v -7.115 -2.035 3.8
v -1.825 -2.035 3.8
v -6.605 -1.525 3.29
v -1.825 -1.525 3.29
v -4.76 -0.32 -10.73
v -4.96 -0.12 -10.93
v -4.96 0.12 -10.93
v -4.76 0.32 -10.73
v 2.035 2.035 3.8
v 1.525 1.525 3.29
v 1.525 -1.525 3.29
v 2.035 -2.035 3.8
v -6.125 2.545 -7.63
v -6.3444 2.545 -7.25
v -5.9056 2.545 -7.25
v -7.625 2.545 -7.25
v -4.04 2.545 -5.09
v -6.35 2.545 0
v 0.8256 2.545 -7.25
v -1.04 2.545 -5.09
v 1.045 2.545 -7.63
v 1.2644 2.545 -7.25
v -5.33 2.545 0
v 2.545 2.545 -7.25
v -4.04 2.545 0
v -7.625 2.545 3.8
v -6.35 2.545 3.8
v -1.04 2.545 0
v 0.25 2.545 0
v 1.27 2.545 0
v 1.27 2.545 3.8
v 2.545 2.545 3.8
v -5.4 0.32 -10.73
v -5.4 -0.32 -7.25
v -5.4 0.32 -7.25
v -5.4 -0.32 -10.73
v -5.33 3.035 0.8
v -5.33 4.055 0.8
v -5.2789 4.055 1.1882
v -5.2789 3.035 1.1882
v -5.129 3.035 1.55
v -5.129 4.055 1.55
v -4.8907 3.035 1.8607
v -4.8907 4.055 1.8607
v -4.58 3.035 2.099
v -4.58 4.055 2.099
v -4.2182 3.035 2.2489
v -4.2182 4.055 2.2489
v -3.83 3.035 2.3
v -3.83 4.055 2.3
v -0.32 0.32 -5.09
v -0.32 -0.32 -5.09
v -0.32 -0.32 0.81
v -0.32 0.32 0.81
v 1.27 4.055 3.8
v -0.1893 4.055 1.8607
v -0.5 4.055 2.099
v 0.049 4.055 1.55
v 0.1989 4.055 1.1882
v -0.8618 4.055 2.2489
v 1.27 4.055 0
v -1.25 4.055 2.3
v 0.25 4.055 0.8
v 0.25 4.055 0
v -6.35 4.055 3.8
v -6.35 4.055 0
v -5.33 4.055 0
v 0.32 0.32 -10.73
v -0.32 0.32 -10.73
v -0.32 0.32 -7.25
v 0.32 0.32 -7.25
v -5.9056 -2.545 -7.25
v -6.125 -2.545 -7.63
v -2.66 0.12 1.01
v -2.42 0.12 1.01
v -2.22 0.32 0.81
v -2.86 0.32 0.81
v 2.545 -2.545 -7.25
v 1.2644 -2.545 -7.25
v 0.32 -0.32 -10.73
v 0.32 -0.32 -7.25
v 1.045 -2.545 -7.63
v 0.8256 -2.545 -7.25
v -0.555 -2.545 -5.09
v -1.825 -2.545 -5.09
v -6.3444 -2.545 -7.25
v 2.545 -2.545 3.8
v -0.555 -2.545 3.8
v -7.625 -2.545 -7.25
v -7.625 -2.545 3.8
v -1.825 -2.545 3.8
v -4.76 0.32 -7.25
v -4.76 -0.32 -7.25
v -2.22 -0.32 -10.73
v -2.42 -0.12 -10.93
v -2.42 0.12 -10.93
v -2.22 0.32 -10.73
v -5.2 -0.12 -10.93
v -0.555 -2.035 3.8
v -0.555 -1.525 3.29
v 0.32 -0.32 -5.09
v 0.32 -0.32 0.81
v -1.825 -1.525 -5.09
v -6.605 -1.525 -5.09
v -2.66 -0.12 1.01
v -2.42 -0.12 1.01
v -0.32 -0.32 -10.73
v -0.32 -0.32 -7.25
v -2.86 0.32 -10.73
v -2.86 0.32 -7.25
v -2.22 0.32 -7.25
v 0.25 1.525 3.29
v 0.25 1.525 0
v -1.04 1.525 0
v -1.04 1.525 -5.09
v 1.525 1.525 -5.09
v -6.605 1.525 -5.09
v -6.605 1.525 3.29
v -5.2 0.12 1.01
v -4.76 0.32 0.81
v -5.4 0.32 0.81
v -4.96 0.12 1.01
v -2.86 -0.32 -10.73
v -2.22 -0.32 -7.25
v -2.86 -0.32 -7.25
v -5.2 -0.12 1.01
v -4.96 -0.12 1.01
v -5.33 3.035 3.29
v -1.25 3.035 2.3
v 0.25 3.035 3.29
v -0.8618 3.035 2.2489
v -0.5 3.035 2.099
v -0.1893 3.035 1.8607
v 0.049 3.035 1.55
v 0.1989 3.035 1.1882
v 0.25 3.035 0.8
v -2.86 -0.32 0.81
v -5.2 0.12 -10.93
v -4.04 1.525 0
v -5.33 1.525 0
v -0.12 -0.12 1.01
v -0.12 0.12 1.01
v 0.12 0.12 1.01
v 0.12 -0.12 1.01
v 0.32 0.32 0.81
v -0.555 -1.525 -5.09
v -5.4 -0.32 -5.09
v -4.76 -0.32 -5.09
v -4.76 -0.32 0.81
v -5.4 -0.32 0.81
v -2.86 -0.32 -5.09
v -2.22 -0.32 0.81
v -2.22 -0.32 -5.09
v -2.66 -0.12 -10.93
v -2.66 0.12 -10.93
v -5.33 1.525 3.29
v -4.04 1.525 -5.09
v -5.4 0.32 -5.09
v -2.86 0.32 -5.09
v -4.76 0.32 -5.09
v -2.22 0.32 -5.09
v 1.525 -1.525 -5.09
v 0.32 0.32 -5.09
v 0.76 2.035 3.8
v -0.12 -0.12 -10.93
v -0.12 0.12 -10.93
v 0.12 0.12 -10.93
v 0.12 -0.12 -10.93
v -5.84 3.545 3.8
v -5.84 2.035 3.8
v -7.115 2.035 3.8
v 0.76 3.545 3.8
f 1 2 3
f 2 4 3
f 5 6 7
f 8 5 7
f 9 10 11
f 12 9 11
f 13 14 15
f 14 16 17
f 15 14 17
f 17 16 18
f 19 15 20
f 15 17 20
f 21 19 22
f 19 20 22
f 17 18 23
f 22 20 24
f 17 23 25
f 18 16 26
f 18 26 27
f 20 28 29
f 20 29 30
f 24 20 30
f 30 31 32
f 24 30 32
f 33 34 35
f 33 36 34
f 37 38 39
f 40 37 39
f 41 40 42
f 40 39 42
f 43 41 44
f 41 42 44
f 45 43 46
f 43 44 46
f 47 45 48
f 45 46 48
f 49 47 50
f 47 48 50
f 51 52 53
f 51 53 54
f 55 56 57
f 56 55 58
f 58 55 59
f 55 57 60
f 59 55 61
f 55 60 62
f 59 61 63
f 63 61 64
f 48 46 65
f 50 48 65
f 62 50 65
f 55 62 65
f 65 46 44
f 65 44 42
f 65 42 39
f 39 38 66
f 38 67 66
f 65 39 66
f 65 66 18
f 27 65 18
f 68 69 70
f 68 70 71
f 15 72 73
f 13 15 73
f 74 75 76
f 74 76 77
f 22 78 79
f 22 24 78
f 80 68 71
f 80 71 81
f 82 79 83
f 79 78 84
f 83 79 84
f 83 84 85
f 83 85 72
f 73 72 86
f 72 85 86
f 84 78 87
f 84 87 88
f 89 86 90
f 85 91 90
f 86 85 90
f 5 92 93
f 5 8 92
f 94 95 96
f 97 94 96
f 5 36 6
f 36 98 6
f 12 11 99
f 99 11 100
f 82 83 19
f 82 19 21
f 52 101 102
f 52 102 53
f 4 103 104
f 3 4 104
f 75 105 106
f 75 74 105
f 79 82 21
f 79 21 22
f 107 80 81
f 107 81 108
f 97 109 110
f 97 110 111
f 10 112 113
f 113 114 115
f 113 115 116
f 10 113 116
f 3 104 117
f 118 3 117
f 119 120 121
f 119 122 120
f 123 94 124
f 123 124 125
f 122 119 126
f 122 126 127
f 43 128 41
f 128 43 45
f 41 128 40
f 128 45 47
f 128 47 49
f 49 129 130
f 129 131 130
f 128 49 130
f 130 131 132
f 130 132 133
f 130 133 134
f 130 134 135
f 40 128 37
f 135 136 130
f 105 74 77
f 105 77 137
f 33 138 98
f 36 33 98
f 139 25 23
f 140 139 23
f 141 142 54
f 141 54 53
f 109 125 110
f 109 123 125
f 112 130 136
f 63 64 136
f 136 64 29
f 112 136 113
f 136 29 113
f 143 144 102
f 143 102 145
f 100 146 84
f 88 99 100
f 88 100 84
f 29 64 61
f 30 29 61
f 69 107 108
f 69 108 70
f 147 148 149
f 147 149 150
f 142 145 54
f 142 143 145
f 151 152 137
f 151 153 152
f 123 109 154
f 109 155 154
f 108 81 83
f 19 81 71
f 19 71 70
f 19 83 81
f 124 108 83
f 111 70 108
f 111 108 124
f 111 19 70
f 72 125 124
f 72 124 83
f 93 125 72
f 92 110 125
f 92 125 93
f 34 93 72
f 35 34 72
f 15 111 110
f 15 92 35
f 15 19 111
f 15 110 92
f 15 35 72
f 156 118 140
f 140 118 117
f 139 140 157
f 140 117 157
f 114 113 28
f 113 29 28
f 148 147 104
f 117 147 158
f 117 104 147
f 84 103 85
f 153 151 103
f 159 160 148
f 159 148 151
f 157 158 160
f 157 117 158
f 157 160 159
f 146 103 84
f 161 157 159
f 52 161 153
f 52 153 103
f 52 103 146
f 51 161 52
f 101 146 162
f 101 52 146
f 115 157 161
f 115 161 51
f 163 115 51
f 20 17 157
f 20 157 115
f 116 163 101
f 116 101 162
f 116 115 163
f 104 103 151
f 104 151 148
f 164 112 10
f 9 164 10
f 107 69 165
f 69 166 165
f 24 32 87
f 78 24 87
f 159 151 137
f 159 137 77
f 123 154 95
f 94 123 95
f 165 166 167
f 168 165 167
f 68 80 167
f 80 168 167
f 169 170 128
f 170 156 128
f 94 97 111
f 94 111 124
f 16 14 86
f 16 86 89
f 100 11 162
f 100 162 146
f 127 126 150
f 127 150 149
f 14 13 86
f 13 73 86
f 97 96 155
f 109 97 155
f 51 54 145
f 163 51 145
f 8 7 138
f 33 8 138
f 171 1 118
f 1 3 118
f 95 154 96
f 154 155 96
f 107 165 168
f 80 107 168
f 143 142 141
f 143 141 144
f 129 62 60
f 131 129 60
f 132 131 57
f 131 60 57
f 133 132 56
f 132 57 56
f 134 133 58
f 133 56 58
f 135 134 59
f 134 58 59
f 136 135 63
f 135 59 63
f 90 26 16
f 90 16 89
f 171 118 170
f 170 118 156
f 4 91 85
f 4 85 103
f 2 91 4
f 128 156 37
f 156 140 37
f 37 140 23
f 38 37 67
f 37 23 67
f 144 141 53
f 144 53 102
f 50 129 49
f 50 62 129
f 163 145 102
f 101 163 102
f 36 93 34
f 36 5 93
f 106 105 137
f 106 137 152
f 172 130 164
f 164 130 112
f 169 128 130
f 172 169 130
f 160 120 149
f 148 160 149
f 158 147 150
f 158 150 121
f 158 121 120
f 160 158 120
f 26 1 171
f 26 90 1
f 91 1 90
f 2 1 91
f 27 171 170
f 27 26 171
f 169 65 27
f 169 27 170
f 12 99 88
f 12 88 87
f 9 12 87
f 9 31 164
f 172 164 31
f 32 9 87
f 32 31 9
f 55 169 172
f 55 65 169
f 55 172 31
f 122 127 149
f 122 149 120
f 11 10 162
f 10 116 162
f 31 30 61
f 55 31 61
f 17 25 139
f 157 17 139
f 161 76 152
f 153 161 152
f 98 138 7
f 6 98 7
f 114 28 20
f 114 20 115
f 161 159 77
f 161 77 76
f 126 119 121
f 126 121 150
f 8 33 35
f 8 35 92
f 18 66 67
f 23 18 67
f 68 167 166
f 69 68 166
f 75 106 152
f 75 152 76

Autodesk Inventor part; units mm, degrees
ref_plane "YZ Plane" through (0, 0, 0) normal (1, 0, 0) x (0, 1, 0)
ref_plane "XZ Plane" through (0, 0, 0) normal (0, 1, 0) x (-1, 0, 0)
ref_plane "XY Plane" through (0, 0, 0) normal (0, 0, 1) x (1, 0, 0)
sketch "Skizze1" plane through (0, 0, 0) normal (0, 0, 1) x (1, 0, 0)
  line L0 (-7.625, -2.545) -> (2.545, -2.545)
  line L1 (2.545, -2.545) -> (2.545, 2.545)
  line L2 (2.545, 2.545) -> (1.27, 2.545)
  line L3 (1.27, 2.545) -> (1.27, 4.055)
  line L4 (1.27, 4.055) -> (-6.35, 4.055)
  line L5 (-6.35, 4.055) -> (-6.35, 2.545)
  line L6 (-6.35, 2.545) -> (-7.625, 2.545)
  line L7 (-7.625, 2.545) -> (-7.625, -2.545)
  line L8 (-5.33, 3.035) -> (0.25, 3.035)
  line L9 (0.25, 3.035) -> (0.25, 1.525)
  line L10 (0.25, 1.525) -> (1.525, 1.525)
  line L11 (1.525, 1.525) -> (1.525, -1.525)
  line L12 (1.525, -1.525) -> (-6.605, -1.525)
  line L13 (-6.605, -1.525) -> (-6.605, 1.525)
  line L14 (-6.605, 1.525) -> (-5.33, 1.525)
  line L15 (-5.33, 1.525) -> (-5.33, 3.035)
  line L16 (-6.605, 0) -> (-5.08, 0) construction
  line L17 (-5.08, 0) -> (0, 0) construction
  line L18 (0, 0) -> (1.525, 0) construction
  point P0 (0, -2.035)
  dimension "d0" = 1.02
  dimension "d1" = 3.05
  dimension "d3" = 7.62
  dimension "d4" = 6.6
  dimension "d5" = 1.525
  dimension "d6" = 5.08
extrude "Extrusion1" add sketch "Skizze1" along normal blind 3.8
sketch "Skizze2" plane through (0, 0, 0) normal (0, 0, -1) x (-1, 0, 0)
  line L0 (-2.545, -2.545) -> (-2.545, 2.545) projected
  line L1 (-2.545, 2.545) -> (-1.27, 2.545) projected
  line L2 (-1.525, 1.525) -> (-0.25, 1.525) projected
  line L3 (-1.525, -1.525) -> (-1.525, 1.525) projected
  line L4 (6.605, -1.525) -> (-1.525, -1.525) projected
  line L5 (7.625, -2.545) -> (-2.545, -2.545) projected
  line L6 (7.625, 2.545) -> (7.625, -2.545) projected
  line L7 (6.605, 1.525) -> (6.605, -1.525) projected
  line L8 (5.33, 1.525) -> (6.605, 1.525) projected
  line L9 (6.35, 2.545) -> (7.625, 2.545) projected
  line L10 (-0.25, 1.525) -> (1.04, 1.525)
  line L11 (-1.27, 2.545) -> (-1.27, 4.055) projected
  line L12 (-1.27, 2.545) -> (1.04, 2.545)
  line L13 (1.04, 2.545) -> (1.04, 1.525)
  line L14 (5.33, 1.525) -> (5.33, 3.035) projected
  line L15 (5.33, 1.525) -> (4.04, 1.525)
  line L16 (6.35, 2.545) -> (4.04, 2.545)
  line L17 (4.04, 2.545) -> (4.04, 1.525)
  point P0 (0, 0)
  dimension "d9" = 3
extrude "Extrusion2" add sketch "Skizze2" along normal blind 5.09
sketch "Skizze3" plane through (0, 0, -5.09) normal (0, 0, -1) x (-1, 0, 0)
  line L0 (-2.545, 2.545) -> (-2.545, -2.545) projected
  line L1 (7.625, 2.545) -> (7.625, -2.545) projected
  line L2 (-2.545, -2.545) -> (7.625, -2.545)
  line L3 (7.625, -2.545) -> (7.625, 2.545)
  line L4 (7.625, 2.545) -> (-2.545, 2.545)
  line L5 (-2.545, 2.545) -> (-2.545, -2.545)
  point P0 (0, 0)
extrude "Extrusion3" add sketch "Skizze3" along normal blind 2.16
sketch "Skizze4" plane through (-6.35, 4.055, 0) normal (0, 1, 0) x (1, 0, 0)
  line L0 (7.62, -3.8) -> (0, -3.8) construction
  line L1 (1.02, 0) -> (2.31, 0) projected
  line L2 (5.1, -2.3) -> (2.52, -2.3)
  line L3 (1.02, -0.8) -> (1.02, 0)
  line L4 (1.02, 0) -> (6.6, 0)
  line L5 (6.6, 0) -> (6.6, -0.8)
  arc A0 (5.1, -2.3) -> (6.6, -0.8) centre (5.1, -0.8) ccw
  arc A1 (1.02, -0.8) -> (2.52, -2.3) centre (2.52, -0.8) ccw
  line L6 (0, 0) -> (0, -3.8) construction
  line L7 (6.6, 0) -> (6.6, -3.8) construction
  line L8 (6.6, 0) -> (6.6, -3.8) construction
  line L9 (1.02, 0) -> (1.02, -3.8) construction
  line L10 (1.02, 0) -> (1.02, -3.8) construction
  point P0 (6.35, 0)
  dimension "d14" = 1.5
  dimension "d15" = 1.5
extrude "Extrusion4" cut sketch "Skizze4" against normal up to surface (1.02 mm away)
sketch "Skizze5" plane through (-7.625, -2.545, 3.8) normal (0, -1, 0) x (1, 0, 0)
  line L0 (0, -11.05) -> (1.2806, -11.05) construction
  line L1 (10.17, -11.05) -> (8.8894, -11.05) construction
  line L2 (1.2806, -11.05) -> (1.7194, -11.05)
  line L3 (1.7194, -11.05) -> (8.4506, -11.05) construction
  line L4 (8.4506, -11.05) -> (8.8894, -11.05)
  line L5 (8.4506, -11.05) -> (8.67, -11.43)
  line L6 (8.67, -11.43) -> (8.8894, -11.05)
  line L7 (1.7194, -11.05) -> (1.5, -11.43)
  line L8 (1.5, -11.43) -> (1.2806, -11.05)
  line L9 (10.17, -11.05) -> (10.17, 0) projected
  point P0 (7.625, -3.8)
  point P1 (0, -11.05)
  dimension "d18" = 0.38
  dimension "d19" = 1.5
extrude "Extrusion5" add sketch "Skizze5" against normal up to surface (5.09 mm away)
sketch "Skizze6" plane through (0, 0, -5.09) normal (0, 0, 1) x (1, 0, 0)
  line L0 (-0.32, 0.32) -> (0.32, 0.32)
  line L1 (0.32, 0.32) -> (0.32, -0.32)
  line L2 (0.32, -0.32) -> (-0.32, -0.32)
  line L3 (-0.32, -0.32) -> (-0.32, 0.32)
  line L4 (0.32, -0.32) -> (-0.32, 0.32) construction
  point P0 (0, 0)
  point P1 (0, 0)
  dimension "d22" = 0.64
extrude "Extrusion6" add sketch "Skizze6" along normal blind 6.1 and the other way blind 5.84
chamfer "Fase1" distance 0.2 angle 45 8 edges at (0, 0.32, 1.01) (0.32, 0, 1.01) (0, -0.32, 1.01) (-0.32, 0, 1.01) (0.32, 0, -10.93) (-0.32, 0, -10.93) (0, -0.32, -10.93) (0, 0.32, -10.93)
pattern_linear "Rechteckige Anordnung1" count 3 spacing 2.54 along (-1, 0, 0) of "Extrusion6", "Fase1"
sketch "Skizze8" plane through (0, 0, 3.8) normal (0, 0, 1) x (1, 0, 0)
  line L0 (1.525, -1.525) -> (-6.605, -1.525) construction
  line L1 (-7.625, -2.545) -> (2.545, -2.545) construction
  line L2 (-1.825, -2.035) -> (-3.255, -2.035) construction
  line L3 (-2.54, -2.545) -> (-2.54, -2.035) construction
  line L4 (-4.525, -1.525) -> (-3.255, -1.525)
  line L5 (-3.255, -1.525) -> (-3.255, -2.545)
  line L6 (-3.255, -2.545) -> (-4.525, -2.545)
  line L7 (-4.525, -2.545) -> (-4.525, -1.525)
  line L8 (-1.825, -1.525) -> (-0.555, -1.525)
  line L9 (-0.555, -1.525) -> (-0.555, -2.545)
  line L10 (-0.555, -2.545) -> (-1.825, -2.545)
  line L11 (-1.825, -2.545) -> (-1.825, -1.525)
  line L12 (-7.625, 2.545) -> (-7.625, -2.545) projected
  point P0 (0, 0)
  dimension "d33" = 1.27
  dimension "d34" = 3.1
extrude "Extrusion7" cut sketch "Skizze8" against normal up to surface (8.89 mm away) contours L8 L9 L10 L11
chamfer "Fase2" distance 0.51 angle 45 9 edges at (-6.605, 0, 3.8) (-4.215, -1.525, 3.8) (-5.9675, 1.525, 3.8) (-5.33, 2.28, 3.8) (-2.54, 3.035, 3.8) (0.25, 2.28, 3.8) (0.8875, 1.525, 3.8) (1.525, 0, 3.8) (0.485, -1.525, 3.8)
properties part number "Molex_3"
